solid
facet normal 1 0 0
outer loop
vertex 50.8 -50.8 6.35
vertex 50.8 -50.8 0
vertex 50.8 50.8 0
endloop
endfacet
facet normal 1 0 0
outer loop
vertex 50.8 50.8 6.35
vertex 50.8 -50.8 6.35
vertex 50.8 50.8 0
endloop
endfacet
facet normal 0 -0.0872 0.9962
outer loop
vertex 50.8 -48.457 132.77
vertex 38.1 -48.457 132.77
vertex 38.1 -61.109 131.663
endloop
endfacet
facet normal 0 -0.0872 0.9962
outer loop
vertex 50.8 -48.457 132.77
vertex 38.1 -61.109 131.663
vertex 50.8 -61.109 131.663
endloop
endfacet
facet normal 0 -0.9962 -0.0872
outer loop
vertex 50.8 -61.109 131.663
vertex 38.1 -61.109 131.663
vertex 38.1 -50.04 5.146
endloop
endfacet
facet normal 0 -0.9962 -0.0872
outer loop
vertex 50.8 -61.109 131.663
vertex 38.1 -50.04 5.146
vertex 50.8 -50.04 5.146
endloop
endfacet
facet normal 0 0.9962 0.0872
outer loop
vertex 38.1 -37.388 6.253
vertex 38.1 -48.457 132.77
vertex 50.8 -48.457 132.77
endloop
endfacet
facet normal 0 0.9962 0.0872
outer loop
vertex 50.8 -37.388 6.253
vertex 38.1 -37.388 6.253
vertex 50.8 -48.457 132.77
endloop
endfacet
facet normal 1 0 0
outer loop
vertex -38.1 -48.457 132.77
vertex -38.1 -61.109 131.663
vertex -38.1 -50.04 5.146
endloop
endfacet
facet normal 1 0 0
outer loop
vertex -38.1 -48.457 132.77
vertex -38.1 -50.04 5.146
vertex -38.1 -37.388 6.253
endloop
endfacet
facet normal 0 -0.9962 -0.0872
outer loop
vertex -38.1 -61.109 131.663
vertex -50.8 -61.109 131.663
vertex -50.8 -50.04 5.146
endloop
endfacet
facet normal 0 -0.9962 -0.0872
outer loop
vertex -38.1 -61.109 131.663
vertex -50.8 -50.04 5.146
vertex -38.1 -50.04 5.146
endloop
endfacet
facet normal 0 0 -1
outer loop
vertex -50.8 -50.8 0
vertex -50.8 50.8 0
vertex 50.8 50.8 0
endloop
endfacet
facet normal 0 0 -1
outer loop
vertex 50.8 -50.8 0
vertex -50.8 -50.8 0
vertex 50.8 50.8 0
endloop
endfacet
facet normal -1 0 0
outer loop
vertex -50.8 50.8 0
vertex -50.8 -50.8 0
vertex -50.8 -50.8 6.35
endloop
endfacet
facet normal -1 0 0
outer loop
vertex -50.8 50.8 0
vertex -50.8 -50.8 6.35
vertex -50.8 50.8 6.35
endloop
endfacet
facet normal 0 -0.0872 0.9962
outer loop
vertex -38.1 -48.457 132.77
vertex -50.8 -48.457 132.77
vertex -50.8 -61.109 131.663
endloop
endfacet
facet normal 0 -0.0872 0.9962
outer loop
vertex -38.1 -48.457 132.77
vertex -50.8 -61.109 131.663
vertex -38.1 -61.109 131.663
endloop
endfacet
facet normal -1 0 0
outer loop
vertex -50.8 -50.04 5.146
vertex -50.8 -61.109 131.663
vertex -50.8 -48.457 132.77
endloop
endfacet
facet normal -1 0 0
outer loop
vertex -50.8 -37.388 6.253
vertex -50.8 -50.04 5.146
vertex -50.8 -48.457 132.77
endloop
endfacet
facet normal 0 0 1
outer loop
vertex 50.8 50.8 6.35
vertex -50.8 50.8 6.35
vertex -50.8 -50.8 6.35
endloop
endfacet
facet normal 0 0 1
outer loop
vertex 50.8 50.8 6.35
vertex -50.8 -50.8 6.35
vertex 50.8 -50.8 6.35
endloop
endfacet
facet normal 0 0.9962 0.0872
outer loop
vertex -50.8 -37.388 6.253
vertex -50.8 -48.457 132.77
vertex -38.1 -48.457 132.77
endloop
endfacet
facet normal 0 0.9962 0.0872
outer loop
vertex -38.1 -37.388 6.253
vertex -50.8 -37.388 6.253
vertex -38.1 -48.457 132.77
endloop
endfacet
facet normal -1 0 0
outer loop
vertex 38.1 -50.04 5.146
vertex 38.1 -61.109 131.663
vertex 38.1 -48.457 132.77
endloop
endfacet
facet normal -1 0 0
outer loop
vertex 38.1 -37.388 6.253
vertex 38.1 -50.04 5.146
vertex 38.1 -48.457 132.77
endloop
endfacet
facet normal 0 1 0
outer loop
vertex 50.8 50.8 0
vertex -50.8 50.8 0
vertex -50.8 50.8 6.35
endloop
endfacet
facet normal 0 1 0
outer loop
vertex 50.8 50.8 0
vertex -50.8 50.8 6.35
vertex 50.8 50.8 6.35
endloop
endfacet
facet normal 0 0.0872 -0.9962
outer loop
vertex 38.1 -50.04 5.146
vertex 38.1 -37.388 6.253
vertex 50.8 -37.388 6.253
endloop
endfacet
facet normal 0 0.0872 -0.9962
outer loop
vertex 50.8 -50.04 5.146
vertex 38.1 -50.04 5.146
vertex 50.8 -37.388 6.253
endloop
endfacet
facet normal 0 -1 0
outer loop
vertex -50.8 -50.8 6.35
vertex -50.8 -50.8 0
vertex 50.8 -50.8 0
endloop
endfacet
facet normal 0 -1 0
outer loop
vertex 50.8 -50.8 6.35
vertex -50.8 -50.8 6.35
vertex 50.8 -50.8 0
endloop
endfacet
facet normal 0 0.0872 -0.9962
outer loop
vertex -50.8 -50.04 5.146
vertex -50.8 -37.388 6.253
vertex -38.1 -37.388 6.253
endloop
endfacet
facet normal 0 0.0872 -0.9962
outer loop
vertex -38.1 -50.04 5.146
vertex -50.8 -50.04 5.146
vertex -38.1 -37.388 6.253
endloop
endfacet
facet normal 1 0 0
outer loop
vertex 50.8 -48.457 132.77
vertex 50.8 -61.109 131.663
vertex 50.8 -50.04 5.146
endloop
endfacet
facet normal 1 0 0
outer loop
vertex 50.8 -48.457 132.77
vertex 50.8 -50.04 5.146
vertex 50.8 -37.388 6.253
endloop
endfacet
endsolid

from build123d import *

# Parameters (mm, degrees)
F0_W     = 101.6
F0_H     = 101.6
F1_DEPTH = 6.35
F4_W     = 12.7
F4_H     = 12.7
F5_DEPTH = 127


with BuildPart() as f1:
    # F0 (on Top) → F1 (new body)
    with BuildSketch(Plane.XY):
        Rectangle(F0_W, F0_H)
    extrude(amount=F1_DEPTH)


with BuildPart() as f5:
    # F4 (on face) → F5 (new body)
    with BuildSketch(Plane(origin=(0, -0.826949, 9.452075), x_dir=(1, 0, 0), z_dir=(0, -0.087156, 0.996195))):
        with Locations((-44.45, -43.051091)):
            Rectangle(F4_W, F4_H)
        with Locations((44.45, -43.051091)):
            Rectangle(F4_W, F4_H)
    extrude(amount=F5_DEPTH)


solid = Compound([f1.part, f5.part])
